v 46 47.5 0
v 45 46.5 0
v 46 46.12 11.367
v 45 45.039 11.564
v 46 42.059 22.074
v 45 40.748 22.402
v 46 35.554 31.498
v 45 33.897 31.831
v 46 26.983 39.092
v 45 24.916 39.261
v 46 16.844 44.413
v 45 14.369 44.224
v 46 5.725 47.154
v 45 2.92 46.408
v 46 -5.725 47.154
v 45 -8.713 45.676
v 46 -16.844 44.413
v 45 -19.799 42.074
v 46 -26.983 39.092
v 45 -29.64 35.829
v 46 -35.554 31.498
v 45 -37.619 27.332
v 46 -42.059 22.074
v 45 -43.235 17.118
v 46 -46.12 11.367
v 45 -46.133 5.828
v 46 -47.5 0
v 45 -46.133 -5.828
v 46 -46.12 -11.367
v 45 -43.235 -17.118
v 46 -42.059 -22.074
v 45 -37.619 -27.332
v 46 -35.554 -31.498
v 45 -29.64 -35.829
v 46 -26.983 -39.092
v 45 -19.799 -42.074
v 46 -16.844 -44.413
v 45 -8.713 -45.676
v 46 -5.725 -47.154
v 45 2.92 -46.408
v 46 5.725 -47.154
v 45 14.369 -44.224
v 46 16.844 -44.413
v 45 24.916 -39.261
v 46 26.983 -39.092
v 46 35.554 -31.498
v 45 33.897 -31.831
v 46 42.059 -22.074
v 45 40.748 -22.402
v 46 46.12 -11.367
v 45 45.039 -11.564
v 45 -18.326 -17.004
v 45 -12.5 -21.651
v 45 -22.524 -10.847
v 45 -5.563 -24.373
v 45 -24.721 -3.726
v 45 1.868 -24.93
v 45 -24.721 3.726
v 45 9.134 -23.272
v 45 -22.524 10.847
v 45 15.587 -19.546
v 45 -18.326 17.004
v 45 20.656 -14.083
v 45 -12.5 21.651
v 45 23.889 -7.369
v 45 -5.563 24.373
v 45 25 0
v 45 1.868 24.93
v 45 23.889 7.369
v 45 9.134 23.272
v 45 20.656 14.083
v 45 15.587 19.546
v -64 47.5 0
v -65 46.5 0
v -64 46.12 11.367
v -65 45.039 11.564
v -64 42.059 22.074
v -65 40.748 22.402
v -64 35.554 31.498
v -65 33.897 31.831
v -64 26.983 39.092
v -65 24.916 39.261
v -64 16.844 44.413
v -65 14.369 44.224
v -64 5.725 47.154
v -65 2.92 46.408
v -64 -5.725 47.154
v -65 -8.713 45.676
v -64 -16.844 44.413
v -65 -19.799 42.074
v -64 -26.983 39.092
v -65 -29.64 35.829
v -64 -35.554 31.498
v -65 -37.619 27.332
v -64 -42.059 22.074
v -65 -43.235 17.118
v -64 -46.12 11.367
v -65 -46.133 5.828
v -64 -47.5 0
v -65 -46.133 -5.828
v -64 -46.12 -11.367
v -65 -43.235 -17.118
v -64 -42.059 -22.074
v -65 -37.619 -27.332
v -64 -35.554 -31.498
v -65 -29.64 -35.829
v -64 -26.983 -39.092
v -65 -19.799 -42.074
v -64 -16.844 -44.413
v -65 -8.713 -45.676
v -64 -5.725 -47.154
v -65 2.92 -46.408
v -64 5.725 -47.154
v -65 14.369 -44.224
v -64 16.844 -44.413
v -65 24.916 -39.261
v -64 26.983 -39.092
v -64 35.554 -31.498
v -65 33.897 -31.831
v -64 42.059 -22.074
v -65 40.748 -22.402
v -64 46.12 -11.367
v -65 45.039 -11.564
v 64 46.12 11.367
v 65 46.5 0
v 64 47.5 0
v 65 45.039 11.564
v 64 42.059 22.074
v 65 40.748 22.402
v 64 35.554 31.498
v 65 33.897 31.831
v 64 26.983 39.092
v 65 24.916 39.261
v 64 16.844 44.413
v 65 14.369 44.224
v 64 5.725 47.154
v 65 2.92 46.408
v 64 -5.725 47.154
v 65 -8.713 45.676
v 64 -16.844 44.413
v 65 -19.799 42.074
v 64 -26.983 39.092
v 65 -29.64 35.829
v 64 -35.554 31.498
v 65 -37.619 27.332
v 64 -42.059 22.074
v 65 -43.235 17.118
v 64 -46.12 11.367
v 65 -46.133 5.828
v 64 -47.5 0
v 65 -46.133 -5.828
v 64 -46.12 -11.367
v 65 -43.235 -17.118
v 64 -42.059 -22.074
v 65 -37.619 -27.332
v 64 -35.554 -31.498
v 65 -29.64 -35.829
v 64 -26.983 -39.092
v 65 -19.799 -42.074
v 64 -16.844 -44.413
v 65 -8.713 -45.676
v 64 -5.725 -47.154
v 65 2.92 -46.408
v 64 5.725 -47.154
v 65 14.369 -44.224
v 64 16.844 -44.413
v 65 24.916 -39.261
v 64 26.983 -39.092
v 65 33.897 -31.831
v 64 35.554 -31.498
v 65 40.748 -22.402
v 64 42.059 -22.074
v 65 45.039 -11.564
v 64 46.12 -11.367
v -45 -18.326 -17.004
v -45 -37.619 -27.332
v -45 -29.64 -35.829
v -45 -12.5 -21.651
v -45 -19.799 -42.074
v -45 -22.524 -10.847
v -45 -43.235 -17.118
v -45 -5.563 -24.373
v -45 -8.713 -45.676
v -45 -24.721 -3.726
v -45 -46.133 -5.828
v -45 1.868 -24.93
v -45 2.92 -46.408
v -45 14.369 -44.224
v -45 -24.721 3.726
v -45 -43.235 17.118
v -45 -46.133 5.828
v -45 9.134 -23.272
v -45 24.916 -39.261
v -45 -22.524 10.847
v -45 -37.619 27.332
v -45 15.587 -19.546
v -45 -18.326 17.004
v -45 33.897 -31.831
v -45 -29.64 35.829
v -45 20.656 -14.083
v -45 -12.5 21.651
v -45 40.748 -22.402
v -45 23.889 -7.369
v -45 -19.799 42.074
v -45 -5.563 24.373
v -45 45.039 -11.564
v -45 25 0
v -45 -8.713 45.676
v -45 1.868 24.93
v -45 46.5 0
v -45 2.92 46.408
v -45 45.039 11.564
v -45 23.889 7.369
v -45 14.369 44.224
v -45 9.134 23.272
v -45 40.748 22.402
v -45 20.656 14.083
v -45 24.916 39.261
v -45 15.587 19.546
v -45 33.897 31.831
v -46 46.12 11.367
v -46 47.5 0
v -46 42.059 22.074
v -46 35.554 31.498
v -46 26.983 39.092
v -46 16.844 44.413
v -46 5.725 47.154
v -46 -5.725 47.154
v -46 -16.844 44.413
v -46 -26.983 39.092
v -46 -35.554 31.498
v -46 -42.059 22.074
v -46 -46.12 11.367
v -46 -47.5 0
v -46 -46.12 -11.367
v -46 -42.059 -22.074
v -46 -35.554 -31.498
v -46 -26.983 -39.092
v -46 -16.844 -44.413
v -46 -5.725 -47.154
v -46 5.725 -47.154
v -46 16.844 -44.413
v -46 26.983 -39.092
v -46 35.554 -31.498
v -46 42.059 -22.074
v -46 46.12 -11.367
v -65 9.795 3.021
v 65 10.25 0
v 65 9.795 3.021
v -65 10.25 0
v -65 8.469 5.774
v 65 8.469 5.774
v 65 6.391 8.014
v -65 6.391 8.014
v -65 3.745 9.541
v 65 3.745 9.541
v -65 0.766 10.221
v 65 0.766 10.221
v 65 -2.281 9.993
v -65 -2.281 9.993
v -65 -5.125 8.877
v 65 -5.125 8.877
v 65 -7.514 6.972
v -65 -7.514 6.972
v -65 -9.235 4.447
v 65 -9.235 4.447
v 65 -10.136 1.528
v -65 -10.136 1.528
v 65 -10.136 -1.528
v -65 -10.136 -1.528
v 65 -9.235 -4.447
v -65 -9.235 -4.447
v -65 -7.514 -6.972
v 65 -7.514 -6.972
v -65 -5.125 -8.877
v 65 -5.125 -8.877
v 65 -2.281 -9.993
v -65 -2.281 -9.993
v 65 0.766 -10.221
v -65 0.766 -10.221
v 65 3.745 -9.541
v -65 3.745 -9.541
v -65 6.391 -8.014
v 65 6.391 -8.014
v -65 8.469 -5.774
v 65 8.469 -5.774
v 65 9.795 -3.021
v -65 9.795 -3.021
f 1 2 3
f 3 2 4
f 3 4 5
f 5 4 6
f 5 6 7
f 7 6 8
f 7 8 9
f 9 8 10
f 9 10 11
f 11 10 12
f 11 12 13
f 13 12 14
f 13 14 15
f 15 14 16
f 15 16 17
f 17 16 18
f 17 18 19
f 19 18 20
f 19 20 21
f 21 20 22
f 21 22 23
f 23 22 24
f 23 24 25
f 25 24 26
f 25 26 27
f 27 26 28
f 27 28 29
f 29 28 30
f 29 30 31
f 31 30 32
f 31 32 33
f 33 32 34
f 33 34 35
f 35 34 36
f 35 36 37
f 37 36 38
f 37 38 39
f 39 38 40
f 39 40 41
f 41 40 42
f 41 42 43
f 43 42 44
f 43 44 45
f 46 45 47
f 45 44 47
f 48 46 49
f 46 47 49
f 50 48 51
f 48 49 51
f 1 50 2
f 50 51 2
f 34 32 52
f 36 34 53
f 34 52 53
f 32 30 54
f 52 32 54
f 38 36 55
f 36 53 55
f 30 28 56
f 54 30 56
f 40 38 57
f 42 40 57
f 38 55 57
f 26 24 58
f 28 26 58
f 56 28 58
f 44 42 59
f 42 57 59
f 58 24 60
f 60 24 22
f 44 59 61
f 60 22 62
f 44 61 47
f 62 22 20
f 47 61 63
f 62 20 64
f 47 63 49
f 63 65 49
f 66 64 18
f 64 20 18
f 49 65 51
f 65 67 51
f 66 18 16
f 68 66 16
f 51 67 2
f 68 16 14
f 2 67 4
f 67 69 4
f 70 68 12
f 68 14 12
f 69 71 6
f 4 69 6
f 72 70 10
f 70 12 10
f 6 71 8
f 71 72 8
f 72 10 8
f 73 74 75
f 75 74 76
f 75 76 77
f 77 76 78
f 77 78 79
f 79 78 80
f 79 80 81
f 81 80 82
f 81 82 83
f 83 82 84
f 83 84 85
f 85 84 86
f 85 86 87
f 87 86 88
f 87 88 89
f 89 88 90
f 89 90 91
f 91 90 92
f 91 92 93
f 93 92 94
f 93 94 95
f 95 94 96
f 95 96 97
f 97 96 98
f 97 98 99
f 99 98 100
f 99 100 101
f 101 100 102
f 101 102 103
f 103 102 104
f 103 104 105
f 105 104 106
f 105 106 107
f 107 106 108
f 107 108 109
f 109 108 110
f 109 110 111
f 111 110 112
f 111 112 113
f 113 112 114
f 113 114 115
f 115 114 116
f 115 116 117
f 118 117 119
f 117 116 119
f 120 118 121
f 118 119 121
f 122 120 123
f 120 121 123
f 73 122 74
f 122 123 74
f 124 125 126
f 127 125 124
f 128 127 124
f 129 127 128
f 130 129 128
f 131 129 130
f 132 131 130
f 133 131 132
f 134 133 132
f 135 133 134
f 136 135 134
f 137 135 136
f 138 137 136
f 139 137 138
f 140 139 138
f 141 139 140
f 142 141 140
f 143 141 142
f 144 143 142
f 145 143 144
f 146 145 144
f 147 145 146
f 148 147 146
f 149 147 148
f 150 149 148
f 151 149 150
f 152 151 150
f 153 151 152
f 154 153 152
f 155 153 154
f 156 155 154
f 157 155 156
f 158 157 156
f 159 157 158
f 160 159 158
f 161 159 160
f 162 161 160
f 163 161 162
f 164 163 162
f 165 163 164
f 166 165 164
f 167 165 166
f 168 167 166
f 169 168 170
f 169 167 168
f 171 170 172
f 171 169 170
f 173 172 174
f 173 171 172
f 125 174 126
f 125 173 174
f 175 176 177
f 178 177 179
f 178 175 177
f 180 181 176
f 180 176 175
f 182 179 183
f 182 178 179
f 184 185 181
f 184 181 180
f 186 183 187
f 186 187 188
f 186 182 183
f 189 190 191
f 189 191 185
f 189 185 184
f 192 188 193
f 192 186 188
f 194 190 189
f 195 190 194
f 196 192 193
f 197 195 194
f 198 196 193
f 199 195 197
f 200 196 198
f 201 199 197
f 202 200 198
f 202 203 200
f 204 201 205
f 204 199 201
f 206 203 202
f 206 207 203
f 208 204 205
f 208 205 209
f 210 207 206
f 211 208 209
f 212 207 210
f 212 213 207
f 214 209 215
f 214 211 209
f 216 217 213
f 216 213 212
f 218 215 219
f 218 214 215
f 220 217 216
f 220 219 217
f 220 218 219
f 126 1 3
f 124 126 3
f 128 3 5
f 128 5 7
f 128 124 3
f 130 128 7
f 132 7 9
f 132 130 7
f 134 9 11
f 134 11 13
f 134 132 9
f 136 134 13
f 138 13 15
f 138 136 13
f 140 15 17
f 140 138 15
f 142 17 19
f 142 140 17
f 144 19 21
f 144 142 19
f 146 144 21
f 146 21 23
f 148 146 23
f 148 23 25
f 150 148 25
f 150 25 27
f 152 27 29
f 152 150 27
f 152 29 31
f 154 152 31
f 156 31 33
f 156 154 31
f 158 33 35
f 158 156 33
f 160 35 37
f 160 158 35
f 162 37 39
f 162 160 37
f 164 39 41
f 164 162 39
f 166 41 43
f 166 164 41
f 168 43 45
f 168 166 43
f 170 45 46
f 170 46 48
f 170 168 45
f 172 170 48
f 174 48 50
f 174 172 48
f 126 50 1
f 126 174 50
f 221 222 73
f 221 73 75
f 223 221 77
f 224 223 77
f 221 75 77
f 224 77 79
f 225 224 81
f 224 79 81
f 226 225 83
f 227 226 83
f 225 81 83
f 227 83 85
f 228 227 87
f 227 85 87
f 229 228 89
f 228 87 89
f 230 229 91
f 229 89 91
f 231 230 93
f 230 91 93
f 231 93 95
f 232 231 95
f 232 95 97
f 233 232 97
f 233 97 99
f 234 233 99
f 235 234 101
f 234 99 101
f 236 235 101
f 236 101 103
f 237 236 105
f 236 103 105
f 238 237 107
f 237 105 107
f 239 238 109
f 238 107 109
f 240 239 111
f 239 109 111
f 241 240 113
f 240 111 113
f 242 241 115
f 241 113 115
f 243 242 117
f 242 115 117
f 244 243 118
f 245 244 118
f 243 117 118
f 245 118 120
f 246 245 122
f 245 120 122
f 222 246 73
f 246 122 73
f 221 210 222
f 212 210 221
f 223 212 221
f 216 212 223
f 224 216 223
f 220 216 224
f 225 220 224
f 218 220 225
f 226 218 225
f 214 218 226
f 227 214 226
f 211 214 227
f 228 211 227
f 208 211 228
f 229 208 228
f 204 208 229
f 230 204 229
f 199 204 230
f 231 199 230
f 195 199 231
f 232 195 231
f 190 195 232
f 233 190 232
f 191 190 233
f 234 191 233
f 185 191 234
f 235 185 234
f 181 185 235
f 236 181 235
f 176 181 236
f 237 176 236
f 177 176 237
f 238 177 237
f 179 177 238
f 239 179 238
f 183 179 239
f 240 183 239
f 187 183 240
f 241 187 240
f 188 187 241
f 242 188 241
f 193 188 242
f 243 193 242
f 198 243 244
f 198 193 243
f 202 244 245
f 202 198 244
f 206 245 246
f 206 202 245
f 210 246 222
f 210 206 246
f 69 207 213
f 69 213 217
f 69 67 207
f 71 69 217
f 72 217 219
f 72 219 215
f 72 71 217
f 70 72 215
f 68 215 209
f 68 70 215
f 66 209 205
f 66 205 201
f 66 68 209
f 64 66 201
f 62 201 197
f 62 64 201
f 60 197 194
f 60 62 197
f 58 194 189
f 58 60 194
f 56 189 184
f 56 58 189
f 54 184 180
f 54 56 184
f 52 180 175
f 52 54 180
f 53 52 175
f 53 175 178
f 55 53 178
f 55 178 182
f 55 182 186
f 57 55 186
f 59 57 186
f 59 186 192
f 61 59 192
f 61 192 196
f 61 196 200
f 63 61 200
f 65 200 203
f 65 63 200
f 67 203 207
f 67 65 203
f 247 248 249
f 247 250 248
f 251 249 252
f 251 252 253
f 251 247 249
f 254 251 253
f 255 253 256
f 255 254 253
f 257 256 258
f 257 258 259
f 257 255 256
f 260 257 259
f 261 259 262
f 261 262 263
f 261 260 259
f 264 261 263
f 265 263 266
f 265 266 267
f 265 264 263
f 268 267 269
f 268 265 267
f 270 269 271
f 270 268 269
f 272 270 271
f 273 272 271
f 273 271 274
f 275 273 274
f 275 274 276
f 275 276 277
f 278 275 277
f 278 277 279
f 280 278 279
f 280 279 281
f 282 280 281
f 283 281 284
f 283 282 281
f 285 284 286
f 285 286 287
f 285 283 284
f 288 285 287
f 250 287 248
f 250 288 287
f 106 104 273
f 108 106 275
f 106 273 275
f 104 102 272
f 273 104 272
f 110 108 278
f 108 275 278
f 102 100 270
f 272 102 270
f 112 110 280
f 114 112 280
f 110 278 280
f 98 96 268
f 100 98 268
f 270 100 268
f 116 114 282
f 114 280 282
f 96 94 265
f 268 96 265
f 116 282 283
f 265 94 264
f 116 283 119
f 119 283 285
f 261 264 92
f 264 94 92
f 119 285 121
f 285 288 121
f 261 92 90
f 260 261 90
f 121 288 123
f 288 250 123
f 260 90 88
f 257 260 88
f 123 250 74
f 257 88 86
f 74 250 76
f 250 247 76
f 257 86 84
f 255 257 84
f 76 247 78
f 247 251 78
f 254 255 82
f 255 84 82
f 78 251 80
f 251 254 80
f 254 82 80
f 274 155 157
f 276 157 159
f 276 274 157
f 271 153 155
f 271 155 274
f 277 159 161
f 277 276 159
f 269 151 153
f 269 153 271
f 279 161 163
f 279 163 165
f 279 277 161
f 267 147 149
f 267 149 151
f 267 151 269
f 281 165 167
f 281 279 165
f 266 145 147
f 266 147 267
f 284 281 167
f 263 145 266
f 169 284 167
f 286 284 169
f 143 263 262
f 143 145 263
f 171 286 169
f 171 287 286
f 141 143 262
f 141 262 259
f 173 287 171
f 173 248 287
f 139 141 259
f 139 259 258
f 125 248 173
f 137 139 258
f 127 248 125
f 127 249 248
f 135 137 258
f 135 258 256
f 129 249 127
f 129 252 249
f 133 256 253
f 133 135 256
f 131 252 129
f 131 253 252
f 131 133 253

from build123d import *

# Parameters (mm, degrees)
F0_R     = 25
F0_R_2   = 10.25
F1_DEPTH = 65
F2_R     = 47.5
F2_R_2   = 25
F3_DEPTH = 20
F4_SIZE  = 1


with BuildPart() as f1:
    # F0 (on Right) → F1 (new body, symmetric)
    with BuildSketch(Plane.YZ):
        Circle(F0_R)
        Circle(F0_R_2, mode=Mode.SUBTRACT)
    extrude(amount=F1_DEPTH, both=True)

    # F2 (on face) → F3 (join)
    with BuildSketch(Plane.YZ.offset(65)):
        Circle(F2_R)
        Circle(F2_R_2, mode=Mode.SUBTRACT)
    extrude(amount=-F3_DEPTH)

    # F4
    f4_edges = [f1.edges().sort_by_distance(p)[0] for p in [
        (55, 47.5, 0),
        (65, -47.5, 0),
        (45, -47.5, 0),
    ]]
    chamfer(f4_edges, length=F4_SIZE)

    # F5: F1 across plane


with BuildPart() as f1_1:
    add(f1.part)
    add(f1.part.mirror(Plane.YZ))


solid = f1_1.part
